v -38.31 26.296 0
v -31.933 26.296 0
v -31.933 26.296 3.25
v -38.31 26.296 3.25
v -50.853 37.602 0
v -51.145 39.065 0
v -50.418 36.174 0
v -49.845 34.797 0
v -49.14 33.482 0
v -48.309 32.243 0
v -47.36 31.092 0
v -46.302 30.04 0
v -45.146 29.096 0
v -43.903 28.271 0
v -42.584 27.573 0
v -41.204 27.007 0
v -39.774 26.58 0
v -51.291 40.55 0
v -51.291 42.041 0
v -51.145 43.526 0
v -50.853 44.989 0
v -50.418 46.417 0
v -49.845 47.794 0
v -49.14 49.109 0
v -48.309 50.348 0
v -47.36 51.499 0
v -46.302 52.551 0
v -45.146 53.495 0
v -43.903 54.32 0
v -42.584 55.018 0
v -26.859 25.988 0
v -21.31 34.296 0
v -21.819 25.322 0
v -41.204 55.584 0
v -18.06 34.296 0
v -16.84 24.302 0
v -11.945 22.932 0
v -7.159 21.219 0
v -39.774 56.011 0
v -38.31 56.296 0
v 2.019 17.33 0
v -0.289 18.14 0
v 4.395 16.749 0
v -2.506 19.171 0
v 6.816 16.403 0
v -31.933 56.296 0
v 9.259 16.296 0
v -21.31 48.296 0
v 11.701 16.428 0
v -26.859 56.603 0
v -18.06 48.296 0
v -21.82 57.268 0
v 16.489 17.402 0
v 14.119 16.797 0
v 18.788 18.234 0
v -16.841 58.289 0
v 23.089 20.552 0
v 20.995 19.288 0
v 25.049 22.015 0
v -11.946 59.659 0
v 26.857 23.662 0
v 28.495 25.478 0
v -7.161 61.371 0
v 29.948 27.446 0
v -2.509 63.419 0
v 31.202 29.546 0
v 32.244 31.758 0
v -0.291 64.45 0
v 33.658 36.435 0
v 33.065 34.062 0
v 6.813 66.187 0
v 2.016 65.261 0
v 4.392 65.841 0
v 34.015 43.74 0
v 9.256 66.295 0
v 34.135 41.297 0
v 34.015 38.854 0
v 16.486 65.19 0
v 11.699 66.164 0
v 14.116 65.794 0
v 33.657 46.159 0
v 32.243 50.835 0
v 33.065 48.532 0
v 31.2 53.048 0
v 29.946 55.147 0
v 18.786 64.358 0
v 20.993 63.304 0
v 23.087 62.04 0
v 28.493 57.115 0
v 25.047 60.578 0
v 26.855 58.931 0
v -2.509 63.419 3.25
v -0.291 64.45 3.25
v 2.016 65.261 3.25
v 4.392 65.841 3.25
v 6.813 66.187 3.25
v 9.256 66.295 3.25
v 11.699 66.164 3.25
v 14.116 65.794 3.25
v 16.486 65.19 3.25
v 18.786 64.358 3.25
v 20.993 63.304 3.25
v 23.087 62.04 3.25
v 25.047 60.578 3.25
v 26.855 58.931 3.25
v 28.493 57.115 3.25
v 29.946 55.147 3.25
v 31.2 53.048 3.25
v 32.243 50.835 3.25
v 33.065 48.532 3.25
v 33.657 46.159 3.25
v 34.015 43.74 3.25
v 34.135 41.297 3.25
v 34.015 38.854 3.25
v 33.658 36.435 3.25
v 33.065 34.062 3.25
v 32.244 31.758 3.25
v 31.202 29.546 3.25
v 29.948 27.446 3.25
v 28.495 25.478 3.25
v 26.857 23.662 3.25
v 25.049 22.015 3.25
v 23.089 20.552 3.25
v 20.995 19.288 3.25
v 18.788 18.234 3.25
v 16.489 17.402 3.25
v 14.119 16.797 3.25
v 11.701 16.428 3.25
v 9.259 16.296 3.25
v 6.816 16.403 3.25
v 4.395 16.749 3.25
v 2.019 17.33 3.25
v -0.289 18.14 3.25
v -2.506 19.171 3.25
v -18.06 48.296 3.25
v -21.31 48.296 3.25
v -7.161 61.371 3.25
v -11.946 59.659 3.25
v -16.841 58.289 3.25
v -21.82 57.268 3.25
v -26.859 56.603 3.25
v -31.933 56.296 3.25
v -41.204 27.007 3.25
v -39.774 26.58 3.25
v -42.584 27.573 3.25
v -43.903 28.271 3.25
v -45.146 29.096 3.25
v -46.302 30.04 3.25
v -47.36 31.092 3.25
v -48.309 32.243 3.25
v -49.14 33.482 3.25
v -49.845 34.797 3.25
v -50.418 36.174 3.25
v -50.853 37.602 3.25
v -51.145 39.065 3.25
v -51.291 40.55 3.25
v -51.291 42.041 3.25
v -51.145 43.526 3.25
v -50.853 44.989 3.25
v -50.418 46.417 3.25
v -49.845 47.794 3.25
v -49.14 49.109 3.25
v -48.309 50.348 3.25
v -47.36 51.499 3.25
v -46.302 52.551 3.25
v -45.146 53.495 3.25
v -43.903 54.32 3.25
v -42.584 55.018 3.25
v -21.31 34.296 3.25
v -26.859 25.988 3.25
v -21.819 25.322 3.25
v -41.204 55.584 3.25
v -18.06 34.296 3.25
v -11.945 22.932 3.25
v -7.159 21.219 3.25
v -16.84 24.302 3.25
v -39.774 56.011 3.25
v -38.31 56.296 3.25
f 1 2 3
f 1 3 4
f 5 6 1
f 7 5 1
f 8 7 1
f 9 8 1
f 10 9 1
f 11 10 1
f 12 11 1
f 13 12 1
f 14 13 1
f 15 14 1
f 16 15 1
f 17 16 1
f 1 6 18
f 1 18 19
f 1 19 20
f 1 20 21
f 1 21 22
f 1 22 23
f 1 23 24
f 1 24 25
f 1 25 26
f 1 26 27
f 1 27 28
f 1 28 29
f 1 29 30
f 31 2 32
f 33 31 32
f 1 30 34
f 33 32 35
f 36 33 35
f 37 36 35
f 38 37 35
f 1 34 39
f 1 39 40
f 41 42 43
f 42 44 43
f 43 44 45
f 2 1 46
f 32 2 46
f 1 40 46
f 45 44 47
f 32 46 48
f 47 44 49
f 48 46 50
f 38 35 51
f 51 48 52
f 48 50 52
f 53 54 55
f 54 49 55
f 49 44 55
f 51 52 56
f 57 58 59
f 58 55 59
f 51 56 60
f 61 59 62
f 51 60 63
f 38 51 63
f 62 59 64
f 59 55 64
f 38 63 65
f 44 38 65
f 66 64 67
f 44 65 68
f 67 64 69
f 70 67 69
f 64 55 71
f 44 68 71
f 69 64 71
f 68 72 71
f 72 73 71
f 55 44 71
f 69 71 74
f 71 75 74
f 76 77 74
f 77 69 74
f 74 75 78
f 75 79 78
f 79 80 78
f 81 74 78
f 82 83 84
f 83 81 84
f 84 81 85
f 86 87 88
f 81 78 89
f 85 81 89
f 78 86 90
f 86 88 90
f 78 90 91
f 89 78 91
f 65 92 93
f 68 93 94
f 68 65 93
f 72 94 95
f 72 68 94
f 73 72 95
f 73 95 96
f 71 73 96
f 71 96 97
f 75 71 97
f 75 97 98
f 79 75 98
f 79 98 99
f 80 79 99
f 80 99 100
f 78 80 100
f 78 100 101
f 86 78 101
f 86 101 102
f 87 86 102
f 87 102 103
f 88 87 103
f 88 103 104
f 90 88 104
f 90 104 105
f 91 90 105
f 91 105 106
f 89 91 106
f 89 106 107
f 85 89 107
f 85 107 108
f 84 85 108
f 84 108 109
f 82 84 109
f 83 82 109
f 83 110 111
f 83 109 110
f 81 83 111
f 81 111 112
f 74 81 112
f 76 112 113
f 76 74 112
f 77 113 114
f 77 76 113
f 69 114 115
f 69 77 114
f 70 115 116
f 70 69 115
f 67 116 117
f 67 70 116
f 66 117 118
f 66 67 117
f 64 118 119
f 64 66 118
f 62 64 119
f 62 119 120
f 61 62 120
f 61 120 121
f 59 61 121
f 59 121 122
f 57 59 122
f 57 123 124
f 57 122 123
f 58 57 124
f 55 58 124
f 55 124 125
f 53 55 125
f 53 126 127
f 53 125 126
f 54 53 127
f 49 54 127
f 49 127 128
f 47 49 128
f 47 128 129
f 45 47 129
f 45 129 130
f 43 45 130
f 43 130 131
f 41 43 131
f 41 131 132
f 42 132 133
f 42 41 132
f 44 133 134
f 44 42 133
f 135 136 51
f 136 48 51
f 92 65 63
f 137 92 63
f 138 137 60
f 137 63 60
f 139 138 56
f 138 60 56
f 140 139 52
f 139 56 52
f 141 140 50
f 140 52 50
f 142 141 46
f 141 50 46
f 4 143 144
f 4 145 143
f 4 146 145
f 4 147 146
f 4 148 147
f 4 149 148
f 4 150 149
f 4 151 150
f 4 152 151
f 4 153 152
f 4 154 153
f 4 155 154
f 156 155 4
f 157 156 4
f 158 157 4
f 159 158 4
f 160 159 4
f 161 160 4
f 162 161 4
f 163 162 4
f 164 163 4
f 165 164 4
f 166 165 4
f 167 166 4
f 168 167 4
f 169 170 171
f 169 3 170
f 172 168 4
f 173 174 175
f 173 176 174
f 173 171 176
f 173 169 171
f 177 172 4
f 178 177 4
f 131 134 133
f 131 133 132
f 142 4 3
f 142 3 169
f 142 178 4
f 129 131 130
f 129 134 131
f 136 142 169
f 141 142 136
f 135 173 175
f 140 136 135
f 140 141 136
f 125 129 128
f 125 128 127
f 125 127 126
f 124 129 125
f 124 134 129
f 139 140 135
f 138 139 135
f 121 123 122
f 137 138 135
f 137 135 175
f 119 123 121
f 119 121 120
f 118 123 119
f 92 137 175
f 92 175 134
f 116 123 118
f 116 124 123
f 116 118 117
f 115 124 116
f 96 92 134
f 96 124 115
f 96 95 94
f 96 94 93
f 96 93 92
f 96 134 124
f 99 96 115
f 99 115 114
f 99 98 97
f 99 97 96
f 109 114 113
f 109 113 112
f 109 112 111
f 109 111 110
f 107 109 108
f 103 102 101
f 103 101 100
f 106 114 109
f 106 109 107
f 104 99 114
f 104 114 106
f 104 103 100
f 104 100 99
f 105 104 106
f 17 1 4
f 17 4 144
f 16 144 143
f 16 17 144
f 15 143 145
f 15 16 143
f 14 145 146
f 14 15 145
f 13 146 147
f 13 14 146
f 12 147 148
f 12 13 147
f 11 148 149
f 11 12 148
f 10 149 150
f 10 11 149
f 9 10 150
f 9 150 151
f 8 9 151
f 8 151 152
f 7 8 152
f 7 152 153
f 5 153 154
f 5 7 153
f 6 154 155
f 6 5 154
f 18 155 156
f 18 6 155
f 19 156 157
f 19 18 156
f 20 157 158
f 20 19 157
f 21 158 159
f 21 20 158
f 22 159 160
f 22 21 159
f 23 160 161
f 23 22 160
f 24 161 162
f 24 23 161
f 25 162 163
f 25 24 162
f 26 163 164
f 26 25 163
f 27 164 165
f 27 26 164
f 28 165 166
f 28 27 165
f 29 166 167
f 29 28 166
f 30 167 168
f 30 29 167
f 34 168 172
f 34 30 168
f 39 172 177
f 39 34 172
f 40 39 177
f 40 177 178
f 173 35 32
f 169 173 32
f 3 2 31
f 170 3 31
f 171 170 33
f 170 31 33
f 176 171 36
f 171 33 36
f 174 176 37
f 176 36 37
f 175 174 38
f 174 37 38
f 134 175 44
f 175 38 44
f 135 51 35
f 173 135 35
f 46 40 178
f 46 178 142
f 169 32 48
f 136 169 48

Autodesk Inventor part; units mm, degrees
ref_plane "YZ Plane" through (0, 0, 0) normal (1, 0, 0) x (0, 1, 0)
ref_plane "XZ Plane" through (0, 0, 0) normal (0, 1, 0) x (-1, 0, 0)
ref_plane "XY Plane" through (0, 0, 0) normal (0, 0, 1) x (1, 0, 0)
sketch "Block1" plane through (0, 0, 0) normal (0, 0, 1) x (1, 0, 0)
  circle A0 centre (74.029, 24.2723) radius 1
  line L0 (49.279, 30.4723) -> (71.779, 30.4723)
  line L1 (71.779, 30.4723) -> (71.779, 18.0723)
  line L2 (71.779, 18.0723) -> (49.279, 18.0723)
  line L3 (49.279, 18.0723) -> (49.279, 30.4723)
  line L4 (49.279, 30.4723) -> (44.779, 30.4723)
  line L5 (44.779, 30.4723) -> (44.779, 18.0723)
  line L6 (44.779, 18.0723) -> (49.279, 18.0723)
  line L7 (49.279, 18.0723) -> (49.279, 30.4723)
  line L8 (71.779, 30.4723) -> (76.279, 30.4723)
  line L9 (76.279, 30.4723) -> (76.279, 18.0723)
  line L10 (76.279, 18.0723) -> (71.779, 18.0723)
  line L11 (71.779, 18.0723) -> (71.779, 30.4723)
  line L12 (44.779, 24.2723) -> (76.279, 24.2723) construction
  line L13 (47.029, 30.4723) -> (47.029, 18.0723) construction
  circle A1 centre (47.029, 24.2723) radius 1
  line L14 (74.029, 30.4723) -> (74.029, 18.0723) construction
  point P0 (60.979, 24.0984)
  dimension "d7" = 22.5
  dimension "d8" = 12.4
  dimension "d9" = 4.5
  dimension "d10" = 4.5
  dimension "d11" = 2
  dimension "d12" = 2
sketch "Sketch1" plane through (0, 0, 0) normal (0, 0, 1) x (1, 0, 0)
  line L0 (-92.7646, -8.503) -> (-89.7646, -8.503)
  line L1 (-89.7646, -8.503) -> (-89.7646, -11.753)
  line L2 (-89.7646, -11.753) -> (-92.7646, -11.753)
  line L3 (-92.7646, -11.753) -> (-92.7646, -8.503)
  line L4 (-92.7646, -21.6527) -> (-89.7646, -21.6527)
  line L5 (-89.7646, -21.6527) -> (-89.7646, -21.7527)
  line L6 (-89.7646, -21.7527) -> (-92.7646, -21.7527)
  line L7 (-92.7646, -21.7527) -> (-92.7646, -21.6527)
  line L8 (-51.3097, 56.2955) -> (-11.3097, 56.2955)
  line L9 (-11.3097, 56.2955) -> (-11.3097, 26.2955)
  line L10 (-11.3097, 26.2955) -> (-51.3097, 26.2955)
  line L11 (-51.3097, 26.2955) -> (-51.3097, 56.2955)
  line L12 (-51.3097, 41.2955) -> (-11.3097, 41.2955) construction
  line L13 (-21.3097, 48.2955) -> (-18.0597, 48.2955)
  line L14 (-18.0597, 48.2955) -> (-18.0597, 34.2955)
  line L15 (-18.0597, 34.2955) -> (-21.3097, 34.2955)
  line L16 (-21.3097, 34.2955) -> (-21.3097, 48.2955)
  line L17 (-21.3097, 41.2955) -> (-18.0597, 41.2955) construction
  line L18 (-11.3097, 66.2955) -> (18.6903, 66.2955)
  line L19 (18.6903, 66.2955) -> (18.6903, 16.2955)
  line L20 (18.6903, 16.2955) -> (-11.3097, 16.2955)
  line L21 (-11.3097, 16.2955) -> (-11.3097, 66.2955)
  line L22 (-11.3097, 41.2955) -> (18.6903, 41.2955) construction
  line L23 (-38.3097, 56.2955) -> (-38.3097, 26.2955) construction
  arc A0 (-38.3097, 56.2955) -> (-38.3097, 26.2955) centre (-36.1559, 41.2955) ccw
  circle A1 centre (9.1348, 41.2955) radius 25
  arc A2 (-31.9326, 56.2955) -> (-1.361, 63.9855) centre (-33.7351, 128.0749) ccw
  line L24 (-31.9326, 56.2955) -> (-31.9326, 53.1229)
  line L25 (-31.9326, 53.1229) -> (-1.361, 53.1229)
  line L26 (-1.361, 53.1229) -> (-1.361, 63.9855)
  arc A3 (-1.361, 18.6054) -> (-31.9326, 26.2955) centre (-33.7351, -45.4839) ccw
  line L27 (-31.9326, 26.2955) -> (-31.9326, 29.468)
  line L28 (-31.9326, 29.468) -> (-1.361, 29.468)
  line L29 (-1.361, 29.468) -> (-1.361, 18.6054)
  point P0 (0, 0)
  dimension "d0" = 3
  dimension "mat" = 3.25
  dimension "d2" = 3
  dimension "d3" = 0.1
  dimension "d23" = 40
  dimension "d24" = 30
  dimension "d29" = 3.25
  dimension "d30" = 14
  dimension "d31" = 30
  dimension "d38" = 30
  dimension "d39" = 50
  dimension "d42" = 13
  dimension "d43" = 50
extrude "Extrusion6" add sketch "Sketch1" along normal blind 3.25 contours L8 L24 L25 A1 L28 L27 L10 A0 | L8 L9 A1 L25 L24 | L27 L28 A1 L9 L10 | A1 A2 L26 L25 L9 | L9 L25 A1 | A1 A2 | L25 L9 L28 A1 | L25 L26 A1 L19 L29 L28 L9 | L28 L9 A1 | L9 L28 L29 A3 A1 | A3 A1 | A1 L19
extrude "Extrusion7" add sketch "Sketch1" along normal blind 3.25 contours A2 L21 L8 | L8 L9 A1 L25 L24 | L21 A2 A1 L9 | A1 A2 L26 L25 L9 | L9 L25 A1
extrude "Extrusion8" add sketch "Sketch1" along normal blind 3.25 contours L27 L28 A1 L9 L10 | L10 L21 A3 | L9 A1 A3 L21 | L28 L9 A1 | L9 L28 L29 A3 A1
equation "\"d29\" = mat"
equation "\"d44\" = mat"
equation "\"d46\" = mat"
equation "\"d48\" = mat"
properties part number "arm-servo"
